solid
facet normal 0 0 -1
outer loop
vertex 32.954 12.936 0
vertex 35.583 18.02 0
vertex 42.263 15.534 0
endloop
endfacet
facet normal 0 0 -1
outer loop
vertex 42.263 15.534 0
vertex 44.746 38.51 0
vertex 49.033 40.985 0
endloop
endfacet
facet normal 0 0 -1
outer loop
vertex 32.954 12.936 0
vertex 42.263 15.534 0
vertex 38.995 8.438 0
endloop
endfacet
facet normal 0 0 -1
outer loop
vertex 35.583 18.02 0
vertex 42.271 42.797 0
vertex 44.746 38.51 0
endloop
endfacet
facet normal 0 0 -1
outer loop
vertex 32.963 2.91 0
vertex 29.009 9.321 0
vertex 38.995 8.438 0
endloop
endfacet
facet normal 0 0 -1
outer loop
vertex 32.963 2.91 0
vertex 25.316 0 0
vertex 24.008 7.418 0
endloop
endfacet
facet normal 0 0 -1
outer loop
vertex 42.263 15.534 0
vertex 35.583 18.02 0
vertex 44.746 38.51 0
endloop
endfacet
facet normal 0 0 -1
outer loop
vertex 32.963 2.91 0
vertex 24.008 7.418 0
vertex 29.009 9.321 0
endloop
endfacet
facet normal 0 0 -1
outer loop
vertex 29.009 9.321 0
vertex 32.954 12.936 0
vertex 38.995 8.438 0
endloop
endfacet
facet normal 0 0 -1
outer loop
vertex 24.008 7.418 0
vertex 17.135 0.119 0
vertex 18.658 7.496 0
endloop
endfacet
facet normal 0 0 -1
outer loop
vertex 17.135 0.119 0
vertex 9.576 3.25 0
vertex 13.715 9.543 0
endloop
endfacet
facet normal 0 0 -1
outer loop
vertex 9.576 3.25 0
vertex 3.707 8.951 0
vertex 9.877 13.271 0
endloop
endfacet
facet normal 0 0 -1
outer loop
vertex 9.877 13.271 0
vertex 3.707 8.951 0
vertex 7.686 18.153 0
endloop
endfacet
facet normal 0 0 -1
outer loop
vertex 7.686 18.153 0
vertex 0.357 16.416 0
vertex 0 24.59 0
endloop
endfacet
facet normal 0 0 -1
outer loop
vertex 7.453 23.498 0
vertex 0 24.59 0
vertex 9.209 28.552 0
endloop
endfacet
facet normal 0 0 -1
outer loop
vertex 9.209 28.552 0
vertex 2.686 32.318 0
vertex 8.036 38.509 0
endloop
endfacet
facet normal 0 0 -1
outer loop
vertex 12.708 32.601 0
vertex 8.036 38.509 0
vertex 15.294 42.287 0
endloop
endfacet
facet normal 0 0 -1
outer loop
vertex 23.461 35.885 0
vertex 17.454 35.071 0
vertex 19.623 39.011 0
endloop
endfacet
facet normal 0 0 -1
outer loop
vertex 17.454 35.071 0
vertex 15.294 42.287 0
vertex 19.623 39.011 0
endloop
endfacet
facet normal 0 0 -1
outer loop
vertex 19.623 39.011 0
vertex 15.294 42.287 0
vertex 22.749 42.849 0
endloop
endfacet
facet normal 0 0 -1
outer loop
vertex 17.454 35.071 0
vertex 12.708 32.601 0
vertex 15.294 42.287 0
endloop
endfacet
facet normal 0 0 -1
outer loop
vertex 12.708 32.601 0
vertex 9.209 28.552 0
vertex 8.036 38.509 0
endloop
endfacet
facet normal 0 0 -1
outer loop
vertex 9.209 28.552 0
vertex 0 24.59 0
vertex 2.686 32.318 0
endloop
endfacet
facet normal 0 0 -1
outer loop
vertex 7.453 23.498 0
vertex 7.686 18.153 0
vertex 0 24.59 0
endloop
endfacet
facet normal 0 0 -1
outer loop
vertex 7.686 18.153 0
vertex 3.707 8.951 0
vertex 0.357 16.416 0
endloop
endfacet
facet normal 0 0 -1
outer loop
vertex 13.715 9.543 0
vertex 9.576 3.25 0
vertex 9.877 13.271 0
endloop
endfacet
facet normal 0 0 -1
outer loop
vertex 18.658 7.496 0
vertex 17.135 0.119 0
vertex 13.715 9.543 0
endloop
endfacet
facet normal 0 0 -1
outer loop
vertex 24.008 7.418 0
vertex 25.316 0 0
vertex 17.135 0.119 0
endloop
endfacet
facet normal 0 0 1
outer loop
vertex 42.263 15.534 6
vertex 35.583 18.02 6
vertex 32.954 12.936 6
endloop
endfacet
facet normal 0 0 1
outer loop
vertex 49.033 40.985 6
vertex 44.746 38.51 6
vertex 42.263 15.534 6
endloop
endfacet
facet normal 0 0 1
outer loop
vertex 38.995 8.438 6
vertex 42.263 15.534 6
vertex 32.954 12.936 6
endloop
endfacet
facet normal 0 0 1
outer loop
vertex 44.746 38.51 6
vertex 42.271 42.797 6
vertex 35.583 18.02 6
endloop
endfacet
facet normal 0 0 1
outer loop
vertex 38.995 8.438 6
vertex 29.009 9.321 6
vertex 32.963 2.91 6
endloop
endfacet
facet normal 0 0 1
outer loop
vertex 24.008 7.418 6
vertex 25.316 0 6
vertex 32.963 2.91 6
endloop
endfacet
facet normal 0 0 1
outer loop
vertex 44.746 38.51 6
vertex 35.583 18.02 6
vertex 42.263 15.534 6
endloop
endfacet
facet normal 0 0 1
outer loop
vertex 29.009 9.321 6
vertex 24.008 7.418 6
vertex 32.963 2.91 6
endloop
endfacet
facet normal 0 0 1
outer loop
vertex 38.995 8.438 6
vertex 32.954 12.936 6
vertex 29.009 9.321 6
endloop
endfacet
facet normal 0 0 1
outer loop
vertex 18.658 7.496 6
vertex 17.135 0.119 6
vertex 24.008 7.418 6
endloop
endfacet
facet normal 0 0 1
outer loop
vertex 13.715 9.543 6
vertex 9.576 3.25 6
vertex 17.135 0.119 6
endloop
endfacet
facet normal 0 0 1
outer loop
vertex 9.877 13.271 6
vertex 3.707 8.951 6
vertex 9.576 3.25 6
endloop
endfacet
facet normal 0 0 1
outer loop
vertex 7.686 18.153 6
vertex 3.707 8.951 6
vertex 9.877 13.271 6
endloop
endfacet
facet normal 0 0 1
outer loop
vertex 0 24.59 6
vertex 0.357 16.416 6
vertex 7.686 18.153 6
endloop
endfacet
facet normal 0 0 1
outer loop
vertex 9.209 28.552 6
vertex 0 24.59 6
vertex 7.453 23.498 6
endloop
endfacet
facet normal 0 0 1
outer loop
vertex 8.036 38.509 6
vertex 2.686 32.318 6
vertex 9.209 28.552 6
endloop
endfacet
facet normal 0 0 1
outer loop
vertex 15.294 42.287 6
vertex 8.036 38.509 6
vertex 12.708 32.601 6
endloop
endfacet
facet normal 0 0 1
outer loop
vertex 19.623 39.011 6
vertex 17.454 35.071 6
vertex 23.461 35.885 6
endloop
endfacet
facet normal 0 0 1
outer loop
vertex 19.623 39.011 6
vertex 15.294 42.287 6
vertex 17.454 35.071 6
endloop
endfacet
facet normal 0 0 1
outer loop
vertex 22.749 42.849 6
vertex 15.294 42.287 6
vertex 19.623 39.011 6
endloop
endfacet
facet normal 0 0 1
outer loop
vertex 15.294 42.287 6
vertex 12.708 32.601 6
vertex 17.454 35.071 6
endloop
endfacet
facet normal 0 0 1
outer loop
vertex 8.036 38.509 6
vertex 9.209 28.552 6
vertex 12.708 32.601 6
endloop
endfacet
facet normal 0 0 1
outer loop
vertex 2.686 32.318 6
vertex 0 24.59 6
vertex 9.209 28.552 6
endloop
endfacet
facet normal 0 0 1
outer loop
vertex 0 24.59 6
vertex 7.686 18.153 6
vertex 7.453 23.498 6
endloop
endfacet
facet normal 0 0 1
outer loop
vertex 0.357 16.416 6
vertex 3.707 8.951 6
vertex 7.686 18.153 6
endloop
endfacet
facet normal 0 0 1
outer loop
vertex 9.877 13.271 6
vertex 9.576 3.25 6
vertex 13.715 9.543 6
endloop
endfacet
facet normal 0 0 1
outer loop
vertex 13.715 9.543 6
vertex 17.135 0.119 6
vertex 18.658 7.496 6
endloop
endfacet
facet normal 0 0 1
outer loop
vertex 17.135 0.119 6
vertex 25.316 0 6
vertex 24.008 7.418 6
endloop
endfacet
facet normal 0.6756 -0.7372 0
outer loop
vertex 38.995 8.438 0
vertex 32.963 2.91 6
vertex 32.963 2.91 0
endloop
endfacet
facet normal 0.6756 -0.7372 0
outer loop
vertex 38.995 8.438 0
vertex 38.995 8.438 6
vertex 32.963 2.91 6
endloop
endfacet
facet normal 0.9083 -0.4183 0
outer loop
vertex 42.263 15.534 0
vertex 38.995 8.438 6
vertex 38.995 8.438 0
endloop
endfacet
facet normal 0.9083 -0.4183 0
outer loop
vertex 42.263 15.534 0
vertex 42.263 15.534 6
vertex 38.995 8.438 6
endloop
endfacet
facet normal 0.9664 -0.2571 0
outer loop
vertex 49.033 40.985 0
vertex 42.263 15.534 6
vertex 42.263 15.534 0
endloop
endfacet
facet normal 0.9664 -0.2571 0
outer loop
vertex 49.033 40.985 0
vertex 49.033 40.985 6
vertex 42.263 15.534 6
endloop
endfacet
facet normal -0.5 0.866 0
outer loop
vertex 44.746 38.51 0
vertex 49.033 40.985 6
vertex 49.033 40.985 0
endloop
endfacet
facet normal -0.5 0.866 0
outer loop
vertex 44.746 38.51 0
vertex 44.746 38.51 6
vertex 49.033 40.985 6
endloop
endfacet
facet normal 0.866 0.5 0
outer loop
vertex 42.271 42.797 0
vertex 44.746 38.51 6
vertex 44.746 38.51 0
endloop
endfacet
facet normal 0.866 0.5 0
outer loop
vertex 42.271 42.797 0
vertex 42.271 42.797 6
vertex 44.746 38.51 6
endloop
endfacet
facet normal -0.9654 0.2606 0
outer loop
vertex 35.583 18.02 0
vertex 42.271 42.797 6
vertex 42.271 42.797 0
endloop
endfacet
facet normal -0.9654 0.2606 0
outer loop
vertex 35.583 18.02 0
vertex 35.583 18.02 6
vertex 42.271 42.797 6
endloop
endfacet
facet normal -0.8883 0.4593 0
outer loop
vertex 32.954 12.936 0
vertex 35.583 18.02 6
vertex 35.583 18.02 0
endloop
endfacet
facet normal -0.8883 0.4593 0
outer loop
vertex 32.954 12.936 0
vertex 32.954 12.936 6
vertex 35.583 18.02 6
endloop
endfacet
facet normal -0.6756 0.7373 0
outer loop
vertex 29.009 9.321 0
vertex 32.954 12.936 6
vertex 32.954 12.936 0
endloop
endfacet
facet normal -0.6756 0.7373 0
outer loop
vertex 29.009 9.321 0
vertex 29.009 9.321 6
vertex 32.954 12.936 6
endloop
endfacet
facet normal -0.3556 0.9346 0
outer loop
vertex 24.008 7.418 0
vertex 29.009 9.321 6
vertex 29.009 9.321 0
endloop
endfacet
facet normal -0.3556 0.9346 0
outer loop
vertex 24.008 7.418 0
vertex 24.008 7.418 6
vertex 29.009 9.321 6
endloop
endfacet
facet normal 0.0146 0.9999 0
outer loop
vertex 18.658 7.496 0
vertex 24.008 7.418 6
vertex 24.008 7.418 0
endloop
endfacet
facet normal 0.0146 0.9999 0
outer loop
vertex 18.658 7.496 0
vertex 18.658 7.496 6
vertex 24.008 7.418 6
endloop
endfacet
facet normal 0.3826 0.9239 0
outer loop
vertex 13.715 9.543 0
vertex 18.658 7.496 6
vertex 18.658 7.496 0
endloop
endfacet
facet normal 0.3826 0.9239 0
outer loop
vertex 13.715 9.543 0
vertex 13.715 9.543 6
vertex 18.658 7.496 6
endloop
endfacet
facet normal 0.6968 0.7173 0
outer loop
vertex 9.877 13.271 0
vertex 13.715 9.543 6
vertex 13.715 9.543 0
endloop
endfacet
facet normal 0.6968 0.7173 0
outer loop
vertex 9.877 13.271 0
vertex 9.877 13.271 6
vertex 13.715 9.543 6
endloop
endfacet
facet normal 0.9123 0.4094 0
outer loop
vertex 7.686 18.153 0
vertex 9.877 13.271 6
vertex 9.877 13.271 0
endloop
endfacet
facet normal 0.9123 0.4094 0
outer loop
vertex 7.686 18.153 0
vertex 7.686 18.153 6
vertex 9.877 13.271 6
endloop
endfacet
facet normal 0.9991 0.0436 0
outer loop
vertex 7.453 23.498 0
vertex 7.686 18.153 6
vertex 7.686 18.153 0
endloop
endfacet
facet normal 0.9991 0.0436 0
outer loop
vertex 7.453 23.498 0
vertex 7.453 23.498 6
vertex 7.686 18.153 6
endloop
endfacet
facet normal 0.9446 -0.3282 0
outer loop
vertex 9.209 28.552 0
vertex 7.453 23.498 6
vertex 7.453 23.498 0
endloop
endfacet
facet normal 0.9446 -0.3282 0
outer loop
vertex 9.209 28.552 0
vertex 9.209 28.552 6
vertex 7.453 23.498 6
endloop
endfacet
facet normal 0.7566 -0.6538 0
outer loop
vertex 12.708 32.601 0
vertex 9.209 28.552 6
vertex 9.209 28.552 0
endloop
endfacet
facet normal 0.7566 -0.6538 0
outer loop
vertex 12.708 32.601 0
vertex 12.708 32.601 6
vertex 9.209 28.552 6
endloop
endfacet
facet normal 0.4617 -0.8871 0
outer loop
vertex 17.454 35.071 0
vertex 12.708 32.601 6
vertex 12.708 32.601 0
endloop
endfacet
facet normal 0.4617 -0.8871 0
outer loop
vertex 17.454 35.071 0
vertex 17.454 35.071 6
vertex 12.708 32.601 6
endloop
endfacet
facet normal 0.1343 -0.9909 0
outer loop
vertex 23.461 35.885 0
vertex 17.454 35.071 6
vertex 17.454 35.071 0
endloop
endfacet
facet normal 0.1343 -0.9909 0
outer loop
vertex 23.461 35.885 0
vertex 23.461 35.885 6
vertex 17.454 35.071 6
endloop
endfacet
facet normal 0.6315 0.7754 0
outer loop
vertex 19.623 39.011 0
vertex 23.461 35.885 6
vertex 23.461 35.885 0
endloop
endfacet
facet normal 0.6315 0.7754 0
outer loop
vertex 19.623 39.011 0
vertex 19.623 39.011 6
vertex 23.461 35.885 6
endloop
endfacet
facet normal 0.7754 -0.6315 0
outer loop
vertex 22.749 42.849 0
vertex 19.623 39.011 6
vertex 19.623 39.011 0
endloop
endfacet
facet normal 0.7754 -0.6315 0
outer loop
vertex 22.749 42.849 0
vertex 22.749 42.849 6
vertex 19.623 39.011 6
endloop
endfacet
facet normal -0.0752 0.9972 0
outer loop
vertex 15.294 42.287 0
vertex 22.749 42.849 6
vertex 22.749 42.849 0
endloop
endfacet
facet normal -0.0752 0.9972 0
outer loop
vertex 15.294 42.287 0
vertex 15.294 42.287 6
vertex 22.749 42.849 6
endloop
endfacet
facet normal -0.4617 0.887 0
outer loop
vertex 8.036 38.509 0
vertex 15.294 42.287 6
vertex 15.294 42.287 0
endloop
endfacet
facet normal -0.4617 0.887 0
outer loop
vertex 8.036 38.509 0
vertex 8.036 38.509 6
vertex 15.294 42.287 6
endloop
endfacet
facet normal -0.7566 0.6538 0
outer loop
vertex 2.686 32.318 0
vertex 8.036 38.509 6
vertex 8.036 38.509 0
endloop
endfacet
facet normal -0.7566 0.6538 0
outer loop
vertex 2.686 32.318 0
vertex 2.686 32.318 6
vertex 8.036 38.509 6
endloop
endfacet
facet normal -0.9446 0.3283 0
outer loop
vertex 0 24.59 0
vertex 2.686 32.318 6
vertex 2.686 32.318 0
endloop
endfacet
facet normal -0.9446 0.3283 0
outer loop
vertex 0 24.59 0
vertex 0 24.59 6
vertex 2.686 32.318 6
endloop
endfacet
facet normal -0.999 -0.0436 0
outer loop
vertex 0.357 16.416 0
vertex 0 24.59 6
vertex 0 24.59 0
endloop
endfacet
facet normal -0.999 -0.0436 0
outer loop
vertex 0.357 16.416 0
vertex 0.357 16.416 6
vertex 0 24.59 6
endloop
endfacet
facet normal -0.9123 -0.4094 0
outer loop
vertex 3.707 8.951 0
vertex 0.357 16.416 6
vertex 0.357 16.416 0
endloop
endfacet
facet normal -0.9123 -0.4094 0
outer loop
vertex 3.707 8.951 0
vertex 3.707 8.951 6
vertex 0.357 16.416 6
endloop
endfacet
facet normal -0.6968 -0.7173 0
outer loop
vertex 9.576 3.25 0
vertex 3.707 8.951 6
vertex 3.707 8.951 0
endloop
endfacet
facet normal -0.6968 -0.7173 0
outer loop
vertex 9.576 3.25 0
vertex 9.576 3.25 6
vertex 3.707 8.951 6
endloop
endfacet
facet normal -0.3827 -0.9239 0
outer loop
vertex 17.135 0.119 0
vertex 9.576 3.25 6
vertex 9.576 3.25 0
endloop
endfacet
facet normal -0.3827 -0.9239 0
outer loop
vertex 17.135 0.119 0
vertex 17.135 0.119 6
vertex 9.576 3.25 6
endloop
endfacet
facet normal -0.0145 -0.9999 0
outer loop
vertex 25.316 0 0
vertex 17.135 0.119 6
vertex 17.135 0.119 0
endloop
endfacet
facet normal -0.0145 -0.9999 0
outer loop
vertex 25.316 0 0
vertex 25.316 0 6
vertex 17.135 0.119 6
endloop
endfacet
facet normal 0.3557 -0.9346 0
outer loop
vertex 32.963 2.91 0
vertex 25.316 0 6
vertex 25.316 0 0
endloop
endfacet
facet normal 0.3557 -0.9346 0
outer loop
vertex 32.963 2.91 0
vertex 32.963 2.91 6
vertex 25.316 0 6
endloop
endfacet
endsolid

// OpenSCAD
$fn = 32;

// ----------------------------------------------------------------------
// Eye lug: ring_tail, 6 mm thick
// ----------------------------------------------------------------------

// --- parameters (mm) ---
profile_height = 6;       // extrusion height
profile_points = 30;      // points of the closed outline

profile = [[19.623, 39.011], [22.749, 42.849], [15.294, 42.287], [8.036, 38.509], [2.686, 32.318], [0, 24.59], [0.357, 16.416], [3.707, 8.951], [9.576, 3.25], [17.135, 0.119], [25.316, 0], [32.963, 2.91], [38.995, 8.438], [42.263, 15.534], [49.033, 40.985], [44.746, 38.51], [42.271, 42.797], [35.583, 18.02], [32.954, 12.936], [29.009, 9.321], [24.008, 7.418], [18.658, 7.496], [13.715, 9.543], [9.877, 13.271], [7.686, 18.153], [7.453, 23.498], [9.209, 28.552], [12.708, 32.601], [17.454, 35.071], [23.461, 35.885]];  // single closed polygon, 30 points, counter clockwise

// --- the one profile operation ---
linear_extrude(height = profile_height) polygon(points = profile);
